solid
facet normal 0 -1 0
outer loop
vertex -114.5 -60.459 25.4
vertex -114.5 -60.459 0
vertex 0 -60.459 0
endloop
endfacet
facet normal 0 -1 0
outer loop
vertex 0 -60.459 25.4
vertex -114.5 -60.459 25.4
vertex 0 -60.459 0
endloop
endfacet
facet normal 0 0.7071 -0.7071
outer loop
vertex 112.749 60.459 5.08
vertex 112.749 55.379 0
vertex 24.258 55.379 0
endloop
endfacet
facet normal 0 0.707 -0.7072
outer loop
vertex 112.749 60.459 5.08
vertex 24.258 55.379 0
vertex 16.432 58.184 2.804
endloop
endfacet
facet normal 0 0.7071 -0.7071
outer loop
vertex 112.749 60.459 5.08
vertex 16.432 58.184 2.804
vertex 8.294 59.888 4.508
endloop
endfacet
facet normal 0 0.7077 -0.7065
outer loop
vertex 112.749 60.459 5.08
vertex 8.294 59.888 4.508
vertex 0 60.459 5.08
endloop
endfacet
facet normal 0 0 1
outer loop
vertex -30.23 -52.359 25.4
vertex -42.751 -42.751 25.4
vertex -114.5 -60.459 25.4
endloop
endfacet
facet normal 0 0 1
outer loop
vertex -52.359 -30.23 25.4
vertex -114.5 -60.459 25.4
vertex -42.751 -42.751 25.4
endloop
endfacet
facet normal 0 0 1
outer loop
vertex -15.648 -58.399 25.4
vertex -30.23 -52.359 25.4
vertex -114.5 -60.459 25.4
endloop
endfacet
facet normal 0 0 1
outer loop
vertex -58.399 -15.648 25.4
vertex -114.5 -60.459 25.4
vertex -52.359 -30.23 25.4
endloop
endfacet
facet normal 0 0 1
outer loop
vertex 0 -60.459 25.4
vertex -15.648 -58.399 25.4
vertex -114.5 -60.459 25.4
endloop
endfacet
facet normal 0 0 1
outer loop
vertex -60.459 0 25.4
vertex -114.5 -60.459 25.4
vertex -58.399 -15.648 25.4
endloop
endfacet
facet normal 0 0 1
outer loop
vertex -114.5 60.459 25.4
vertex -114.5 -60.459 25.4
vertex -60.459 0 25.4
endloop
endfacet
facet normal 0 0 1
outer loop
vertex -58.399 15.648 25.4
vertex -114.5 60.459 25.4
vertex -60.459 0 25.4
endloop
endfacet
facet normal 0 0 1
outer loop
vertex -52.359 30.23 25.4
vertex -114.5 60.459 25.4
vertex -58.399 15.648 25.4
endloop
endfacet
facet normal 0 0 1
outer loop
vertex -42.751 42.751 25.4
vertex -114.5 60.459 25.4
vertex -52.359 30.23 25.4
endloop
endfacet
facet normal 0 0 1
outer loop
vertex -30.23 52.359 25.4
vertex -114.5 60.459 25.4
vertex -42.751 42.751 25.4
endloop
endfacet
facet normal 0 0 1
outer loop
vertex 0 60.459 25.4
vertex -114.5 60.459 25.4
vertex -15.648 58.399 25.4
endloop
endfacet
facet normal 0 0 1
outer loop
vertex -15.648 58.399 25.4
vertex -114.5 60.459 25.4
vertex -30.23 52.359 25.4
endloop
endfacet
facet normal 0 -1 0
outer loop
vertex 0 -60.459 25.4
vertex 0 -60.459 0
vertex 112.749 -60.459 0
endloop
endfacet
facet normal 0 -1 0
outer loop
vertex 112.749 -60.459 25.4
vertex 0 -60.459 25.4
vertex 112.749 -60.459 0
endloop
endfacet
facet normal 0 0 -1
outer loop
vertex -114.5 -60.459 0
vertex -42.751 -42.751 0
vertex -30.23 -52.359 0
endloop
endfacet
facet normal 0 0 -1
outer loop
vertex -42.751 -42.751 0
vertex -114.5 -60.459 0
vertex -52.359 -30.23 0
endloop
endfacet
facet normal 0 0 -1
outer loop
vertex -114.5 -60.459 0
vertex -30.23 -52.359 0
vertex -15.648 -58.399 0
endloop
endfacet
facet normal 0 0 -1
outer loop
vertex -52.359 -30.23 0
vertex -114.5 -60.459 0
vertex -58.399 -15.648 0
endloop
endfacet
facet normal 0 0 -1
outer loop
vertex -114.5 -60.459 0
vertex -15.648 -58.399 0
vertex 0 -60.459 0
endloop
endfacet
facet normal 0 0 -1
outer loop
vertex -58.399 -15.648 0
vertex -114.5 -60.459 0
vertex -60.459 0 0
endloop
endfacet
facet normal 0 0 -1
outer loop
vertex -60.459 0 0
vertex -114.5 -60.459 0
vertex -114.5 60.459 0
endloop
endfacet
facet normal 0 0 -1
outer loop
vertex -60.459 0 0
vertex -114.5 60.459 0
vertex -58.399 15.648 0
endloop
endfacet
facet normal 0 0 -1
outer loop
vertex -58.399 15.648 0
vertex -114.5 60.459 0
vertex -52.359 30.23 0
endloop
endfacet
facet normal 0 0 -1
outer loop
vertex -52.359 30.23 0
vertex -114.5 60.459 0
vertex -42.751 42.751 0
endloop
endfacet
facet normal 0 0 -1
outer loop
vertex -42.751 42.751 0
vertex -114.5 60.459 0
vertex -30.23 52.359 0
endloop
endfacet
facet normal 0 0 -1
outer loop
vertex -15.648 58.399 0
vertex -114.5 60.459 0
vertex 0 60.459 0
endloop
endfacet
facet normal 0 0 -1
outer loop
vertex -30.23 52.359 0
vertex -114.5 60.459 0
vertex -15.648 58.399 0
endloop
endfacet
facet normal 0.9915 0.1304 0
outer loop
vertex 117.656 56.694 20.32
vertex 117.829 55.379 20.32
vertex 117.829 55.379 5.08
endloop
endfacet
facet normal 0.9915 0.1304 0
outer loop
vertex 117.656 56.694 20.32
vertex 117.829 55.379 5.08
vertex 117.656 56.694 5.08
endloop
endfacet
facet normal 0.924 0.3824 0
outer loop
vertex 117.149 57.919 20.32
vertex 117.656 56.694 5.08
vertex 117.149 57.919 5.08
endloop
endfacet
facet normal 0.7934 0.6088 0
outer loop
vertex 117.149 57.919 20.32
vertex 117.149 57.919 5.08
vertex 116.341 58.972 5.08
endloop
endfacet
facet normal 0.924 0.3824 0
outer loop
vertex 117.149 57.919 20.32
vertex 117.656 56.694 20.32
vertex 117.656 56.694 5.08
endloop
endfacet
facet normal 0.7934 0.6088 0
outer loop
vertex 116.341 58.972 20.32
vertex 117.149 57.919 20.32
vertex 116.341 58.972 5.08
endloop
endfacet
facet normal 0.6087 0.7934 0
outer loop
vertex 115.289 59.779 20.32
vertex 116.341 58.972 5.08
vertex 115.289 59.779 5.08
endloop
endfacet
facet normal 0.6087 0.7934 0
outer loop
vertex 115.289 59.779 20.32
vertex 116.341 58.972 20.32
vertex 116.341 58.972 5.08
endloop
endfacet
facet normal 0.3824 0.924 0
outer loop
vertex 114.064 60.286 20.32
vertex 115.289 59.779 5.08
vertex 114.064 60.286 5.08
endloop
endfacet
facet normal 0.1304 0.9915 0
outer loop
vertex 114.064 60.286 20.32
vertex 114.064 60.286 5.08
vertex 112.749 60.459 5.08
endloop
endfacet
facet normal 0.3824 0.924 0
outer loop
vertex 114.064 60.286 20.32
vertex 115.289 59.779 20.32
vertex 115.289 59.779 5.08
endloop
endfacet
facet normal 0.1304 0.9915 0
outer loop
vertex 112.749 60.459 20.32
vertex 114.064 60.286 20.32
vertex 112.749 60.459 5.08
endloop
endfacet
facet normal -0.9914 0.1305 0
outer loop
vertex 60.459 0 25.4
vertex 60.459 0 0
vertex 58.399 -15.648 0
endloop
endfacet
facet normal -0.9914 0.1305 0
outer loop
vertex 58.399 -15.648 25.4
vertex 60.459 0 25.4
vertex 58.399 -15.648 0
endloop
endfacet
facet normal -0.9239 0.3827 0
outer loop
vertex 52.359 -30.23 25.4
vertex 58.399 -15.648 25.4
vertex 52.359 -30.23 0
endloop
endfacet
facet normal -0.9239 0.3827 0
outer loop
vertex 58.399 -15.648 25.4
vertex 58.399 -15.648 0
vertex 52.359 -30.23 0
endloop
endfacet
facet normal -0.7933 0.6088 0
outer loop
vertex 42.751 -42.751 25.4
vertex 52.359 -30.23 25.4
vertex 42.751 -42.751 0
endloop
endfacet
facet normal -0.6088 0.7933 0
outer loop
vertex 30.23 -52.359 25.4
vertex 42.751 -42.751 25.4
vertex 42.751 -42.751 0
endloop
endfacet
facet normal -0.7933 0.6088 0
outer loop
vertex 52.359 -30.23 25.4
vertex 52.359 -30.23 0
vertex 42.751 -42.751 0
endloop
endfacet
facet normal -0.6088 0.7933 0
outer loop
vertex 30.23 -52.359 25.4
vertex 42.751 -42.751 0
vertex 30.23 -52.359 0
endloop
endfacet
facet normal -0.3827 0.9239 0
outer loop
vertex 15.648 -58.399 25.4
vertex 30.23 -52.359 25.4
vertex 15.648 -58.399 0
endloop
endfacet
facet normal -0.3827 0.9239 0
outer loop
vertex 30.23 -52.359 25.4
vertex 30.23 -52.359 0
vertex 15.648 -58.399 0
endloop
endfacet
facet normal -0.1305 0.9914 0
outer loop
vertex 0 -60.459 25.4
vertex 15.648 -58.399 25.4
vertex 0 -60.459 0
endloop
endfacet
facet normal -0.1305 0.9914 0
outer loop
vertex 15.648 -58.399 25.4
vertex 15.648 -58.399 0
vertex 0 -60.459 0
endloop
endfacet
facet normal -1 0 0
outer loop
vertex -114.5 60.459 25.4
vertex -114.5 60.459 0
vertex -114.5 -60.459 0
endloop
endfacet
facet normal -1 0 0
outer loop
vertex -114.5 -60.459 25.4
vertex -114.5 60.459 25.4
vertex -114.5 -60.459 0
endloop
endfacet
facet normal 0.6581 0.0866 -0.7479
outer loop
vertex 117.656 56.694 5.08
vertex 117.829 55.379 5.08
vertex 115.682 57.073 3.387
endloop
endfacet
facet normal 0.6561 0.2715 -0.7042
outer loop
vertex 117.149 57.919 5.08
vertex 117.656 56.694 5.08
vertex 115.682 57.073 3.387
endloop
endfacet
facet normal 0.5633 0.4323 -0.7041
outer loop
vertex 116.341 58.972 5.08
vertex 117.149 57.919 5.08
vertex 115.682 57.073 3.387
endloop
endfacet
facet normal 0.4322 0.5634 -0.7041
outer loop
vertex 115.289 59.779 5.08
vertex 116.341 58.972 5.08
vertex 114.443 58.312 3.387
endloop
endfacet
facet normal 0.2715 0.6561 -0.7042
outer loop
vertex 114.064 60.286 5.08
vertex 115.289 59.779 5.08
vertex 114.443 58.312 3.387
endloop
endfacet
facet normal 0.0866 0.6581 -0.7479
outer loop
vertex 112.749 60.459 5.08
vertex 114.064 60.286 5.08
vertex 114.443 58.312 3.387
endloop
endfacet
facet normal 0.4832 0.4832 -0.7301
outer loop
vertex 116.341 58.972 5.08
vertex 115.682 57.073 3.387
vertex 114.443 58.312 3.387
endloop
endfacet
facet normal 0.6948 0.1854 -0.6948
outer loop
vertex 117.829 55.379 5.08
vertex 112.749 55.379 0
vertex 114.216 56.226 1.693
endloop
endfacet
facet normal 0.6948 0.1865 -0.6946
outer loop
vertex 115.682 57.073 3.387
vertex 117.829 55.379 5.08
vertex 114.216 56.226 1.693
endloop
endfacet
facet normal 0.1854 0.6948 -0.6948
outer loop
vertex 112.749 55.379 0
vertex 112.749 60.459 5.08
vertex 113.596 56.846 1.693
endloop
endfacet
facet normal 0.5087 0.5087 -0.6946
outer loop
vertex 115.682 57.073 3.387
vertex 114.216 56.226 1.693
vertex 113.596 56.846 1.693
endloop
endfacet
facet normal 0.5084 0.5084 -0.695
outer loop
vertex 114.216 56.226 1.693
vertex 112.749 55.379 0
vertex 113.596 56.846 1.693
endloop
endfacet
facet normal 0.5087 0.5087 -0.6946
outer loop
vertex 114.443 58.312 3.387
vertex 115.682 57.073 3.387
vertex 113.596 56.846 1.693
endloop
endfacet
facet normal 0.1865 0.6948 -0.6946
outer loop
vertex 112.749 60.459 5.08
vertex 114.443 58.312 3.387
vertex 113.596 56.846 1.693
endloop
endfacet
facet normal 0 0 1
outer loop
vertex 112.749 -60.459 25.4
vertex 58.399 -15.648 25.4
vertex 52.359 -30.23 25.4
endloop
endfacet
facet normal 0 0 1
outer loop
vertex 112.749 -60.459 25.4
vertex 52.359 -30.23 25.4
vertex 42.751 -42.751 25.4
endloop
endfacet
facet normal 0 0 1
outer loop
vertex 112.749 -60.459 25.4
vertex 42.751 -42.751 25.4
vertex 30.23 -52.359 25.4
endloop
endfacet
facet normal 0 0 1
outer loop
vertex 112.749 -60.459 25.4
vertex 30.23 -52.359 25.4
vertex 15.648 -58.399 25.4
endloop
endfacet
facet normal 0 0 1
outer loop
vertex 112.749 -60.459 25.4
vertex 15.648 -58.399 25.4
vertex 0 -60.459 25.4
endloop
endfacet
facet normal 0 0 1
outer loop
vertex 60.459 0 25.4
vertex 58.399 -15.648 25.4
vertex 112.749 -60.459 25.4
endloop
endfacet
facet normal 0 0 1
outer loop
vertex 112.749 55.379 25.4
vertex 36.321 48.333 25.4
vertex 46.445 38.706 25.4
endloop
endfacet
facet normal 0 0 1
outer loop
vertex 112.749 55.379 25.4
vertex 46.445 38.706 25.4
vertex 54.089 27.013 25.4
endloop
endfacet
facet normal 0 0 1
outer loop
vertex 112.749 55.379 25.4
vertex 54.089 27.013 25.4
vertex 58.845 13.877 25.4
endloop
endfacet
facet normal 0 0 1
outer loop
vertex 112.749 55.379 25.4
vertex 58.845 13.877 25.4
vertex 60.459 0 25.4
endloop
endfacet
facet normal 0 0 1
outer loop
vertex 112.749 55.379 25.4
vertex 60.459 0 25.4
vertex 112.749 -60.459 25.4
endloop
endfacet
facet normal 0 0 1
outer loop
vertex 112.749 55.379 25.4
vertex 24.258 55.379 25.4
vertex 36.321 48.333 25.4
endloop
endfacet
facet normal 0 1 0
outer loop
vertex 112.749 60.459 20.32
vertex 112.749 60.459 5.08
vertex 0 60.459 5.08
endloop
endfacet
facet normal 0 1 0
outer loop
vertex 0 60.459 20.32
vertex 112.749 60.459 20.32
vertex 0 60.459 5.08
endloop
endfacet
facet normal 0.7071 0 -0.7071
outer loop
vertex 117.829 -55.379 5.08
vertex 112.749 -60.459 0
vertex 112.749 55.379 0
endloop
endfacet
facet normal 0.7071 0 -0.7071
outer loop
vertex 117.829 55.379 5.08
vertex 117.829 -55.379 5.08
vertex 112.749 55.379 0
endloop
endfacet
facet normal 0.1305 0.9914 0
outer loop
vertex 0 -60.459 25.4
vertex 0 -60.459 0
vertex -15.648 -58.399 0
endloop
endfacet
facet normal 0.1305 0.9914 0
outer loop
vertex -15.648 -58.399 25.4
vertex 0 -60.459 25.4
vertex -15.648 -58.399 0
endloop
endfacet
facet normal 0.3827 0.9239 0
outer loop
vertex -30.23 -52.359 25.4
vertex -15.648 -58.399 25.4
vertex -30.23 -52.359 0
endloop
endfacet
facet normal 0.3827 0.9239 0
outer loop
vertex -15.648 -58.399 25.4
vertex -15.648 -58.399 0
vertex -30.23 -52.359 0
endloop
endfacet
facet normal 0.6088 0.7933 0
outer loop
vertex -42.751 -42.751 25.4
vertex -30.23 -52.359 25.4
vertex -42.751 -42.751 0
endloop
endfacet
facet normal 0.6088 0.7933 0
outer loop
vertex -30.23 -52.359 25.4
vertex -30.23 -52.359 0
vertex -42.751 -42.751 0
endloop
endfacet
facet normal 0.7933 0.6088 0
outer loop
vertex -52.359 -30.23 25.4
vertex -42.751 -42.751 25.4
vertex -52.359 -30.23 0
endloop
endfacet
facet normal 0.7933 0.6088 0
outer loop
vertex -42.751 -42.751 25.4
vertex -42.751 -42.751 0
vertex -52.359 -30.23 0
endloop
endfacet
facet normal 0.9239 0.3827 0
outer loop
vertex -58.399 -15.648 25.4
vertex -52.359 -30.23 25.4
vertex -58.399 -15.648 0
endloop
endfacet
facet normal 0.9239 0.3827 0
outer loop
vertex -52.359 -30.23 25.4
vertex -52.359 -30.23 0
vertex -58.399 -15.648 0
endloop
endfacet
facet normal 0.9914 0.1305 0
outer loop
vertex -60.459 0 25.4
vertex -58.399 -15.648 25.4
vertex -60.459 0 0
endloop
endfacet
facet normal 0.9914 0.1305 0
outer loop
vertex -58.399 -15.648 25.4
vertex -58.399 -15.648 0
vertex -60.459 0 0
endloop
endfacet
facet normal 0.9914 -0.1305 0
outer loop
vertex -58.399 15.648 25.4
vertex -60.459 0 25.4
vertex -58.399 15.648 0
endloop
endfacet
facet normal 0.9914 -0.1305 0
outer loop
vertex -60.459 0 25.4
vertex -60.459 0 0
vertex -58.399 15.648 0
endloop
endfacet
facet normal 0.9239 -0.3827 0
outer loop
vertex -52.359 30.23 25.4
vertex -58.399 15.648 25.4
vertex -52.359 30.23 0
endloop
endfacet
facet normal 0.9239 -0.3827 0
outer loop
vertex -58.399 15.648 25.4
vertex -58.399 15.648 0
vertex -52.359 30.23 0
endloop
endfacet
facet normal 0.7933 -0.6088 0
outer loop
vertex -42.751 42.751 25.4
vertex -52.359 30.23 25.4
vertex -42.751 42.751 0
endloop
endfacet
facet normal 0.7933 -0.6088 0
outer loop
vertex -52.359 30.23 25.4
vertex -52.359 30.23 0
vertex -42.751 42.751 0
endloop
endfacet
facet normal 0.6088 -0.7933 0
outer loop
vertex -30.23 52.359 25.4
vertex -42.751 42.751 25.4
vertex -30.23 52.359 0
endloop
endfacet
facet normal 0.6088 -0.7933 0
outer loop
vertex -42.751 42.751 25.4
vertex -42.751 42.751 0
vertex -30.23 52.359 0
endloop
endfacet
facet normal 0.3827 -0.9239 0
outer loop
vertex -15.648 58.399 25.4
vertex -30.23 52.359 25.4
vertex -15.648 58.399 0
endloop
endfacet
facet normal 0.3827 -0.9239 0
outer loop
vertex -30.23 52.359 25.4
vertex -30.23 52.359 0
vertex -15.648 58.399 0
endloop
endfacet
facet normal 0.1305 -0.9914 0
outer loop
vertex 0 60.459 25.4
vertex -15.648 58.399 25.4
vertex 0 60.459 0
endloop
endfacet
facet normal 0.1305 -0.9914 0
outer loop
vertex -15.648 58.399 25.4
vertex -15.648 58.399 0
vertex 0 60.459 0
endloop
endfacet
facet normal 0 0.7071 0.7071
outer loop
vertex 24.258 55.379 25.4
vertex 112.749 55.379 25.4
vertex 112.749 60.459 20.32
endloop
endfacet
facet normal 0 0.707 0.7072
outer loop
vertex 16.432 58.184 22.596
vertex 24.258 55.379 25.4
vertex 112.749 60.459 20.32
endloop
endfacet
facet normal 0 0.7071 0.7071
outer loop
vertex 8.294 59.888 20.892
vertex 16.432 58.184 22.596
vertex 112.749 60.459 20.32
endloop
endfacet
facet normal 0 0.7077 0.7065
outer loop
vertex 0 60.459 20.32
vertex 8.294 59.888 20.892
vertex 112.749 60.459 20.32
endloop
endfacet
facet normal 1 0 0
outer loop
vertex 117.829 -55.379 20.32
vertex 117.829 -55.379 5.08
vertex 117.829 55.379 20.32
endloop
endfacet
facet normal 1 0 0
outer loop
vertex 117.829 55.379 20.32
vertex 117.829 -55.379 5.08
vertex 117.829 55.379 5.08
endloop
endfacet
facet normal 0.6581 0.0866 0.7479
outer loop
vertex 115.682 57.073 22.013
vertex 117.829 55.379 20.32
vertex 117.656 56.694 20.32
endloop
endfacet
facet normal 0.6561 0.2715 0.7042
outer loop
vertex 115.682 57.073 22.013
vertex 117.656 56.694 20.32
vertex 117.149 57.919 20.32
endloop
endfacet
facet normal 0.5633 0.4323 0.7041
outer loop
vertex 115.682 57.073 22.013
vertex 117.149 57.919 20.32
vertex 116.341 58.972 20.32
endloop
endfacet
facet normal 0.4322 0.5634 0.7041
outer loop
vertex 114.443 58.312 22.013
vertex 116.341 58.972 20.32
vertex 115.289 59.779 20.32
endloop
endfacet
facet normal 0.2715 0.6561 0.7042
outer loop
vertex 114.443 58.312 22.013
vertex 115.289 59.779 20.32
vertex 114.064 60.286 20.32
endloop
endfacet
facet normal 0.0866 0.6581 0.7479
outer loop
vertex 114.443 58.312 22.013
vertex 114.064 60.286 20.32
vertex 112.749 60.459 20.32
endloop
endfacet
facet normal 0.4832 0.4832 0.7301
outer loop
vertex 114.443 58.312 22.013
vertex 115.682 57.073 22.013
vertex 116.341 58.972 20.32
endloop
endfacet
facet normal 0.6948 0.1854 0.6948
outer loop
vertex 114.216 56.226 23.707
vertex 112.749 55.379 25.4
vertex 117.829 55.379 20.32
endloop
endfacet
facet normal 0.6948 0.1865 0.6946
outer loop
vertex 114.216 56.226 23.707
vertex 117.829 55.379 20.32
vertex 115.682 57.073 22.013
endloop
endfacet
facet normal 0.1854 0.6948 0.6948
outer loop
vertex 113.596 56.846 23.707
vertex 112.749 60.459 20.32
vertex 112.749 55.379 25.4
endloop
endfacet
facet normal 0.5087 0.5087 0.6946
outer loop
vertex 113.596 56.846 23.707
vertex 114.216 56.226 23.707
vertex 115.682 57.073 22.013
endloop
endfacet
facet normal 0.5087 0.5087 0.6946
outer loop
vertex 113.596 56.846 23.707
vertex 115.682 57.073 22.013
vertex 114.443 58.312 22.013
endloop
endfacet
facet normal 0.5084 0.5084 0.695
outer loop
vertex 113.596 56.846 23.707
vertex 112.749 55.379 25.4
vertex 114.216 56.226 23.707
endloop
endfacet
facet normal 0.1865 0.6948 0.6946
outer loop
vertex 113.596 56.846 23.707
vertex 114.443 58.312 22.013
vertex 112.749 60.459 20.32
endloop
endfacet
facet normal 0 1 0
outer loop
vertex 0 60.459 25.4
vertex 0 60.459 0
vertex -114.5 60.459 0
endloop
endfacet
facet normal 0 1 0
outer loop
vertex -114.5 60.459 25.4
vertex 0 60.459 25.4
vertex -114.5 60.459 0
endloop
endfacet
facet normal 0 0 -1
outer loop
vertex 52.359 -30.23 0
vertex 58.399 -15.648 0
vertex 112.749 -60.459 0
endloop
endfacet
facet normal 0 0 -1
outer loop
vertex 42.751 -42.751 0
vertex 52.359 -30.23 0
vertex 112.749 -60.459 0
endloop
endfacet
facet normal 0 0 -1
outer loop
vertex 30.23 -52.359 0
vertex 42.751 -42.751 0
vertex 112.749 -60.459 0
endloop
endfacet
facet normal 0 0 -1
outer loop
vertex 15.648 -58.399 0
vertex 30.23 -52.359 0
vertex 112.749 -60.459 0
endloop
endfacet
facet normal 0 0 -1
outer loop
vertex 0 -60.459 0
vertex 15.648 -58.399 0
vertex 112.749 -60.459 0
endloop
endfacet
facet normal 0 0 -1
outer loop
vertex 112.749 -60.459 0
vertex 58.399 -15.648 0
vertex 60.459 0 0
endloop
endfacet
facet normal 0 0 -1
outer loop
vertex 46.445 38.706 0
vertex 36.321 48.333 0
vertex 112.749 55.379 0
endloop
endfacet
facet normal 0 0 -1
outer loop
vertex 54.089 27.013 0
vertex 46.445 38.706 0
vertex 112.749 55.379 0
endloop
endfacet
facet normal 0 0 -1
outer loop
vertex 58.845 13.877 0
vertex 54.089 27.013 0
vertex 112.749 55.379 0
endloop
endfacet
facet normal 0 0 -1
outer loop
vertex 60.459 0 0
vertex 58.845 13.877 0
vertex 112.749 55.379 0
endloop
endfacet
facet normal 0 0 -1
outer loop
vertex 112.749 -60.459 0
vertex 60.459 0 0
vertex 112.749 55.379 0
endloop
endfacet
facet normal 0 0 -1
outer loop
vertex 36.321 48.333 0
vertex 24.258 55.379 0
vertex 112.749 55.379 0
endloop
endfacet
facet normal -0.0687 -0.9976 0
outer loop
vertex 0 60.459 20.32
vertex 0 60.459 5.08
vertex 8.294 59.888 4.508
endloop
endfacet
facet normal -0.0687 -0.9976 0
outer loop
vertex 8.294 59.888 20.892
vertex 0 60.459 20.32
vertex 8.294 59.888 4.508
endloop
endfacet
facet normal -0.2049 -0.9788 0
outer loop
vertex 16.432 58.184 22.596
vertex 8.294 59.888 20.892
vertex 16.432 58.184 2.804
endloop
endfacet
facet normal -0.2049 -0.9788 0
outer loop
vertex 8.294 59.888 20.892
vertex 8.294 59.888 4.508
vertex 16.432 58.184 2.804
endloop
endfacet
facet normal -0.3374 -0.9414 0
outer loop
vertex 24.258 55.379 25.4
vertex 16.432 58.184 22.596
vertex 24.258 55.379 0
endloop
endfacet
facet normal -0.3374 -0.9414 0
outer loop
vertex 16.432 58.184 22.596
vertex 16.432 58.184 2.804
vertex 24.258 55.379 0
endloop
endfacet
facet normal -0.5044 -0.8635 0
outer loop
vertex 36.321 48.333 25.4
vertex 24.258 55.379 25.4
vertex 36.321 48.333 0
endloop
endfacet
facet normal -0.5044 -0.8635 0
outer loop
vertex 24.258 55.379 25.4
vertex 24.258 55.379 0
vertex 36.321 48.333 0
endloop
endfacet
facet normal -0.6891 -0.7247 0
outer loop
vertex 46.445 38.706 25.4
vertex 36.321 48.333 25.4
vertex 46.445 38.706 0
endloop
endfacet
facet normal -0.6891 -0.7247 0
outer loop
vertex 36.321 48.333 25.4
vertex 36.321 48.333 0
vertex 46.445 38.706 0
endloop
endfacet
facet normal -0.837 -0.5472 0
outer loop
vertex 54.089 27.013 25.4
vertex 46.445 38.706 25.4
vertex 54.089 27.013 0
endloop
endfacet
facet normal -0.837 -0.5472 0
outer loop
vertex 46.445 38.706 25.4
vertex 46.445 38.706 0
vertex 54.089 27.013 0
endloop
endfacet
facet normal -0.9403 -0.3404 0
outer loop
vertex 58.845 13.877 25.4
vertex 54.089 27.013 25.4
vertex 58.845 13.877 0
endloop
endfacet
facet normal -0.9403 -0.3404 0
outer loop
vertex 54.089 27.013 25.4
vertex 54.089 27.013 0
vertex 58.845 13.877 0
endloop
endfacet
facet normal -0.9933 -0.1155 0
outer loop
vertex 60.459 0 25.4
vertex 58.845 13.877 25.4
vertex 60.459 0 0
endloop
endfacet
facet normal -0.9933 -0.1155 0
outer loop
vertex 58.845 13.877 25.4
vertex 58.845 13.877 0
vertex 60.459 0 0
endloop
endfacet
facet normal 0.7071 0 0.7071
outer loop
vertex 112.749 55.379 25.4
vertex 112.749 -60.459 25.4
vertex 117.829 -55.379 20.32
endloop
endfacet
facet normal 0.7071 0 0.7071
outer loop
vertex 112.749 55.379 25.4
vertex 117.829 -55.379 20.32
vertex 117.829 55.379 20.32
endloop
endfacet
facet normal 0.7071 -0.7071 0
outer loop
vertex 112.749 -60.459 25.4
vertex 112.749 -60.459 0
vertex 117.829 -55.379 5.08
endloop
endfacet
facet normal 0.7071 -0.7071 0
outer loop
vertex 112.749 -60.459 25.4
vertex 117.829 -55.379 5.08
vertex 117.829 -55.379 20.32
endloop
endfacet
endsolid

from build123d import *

# Parameters (mm, degrees)
F1_DEPTH = 25.4
F2_R     = 5.08
F3_SIZE  = 5.08


with BuildPart() as f1:
    # F0 (on Top) → F1 (new body)
    with BuildSketch(Plane.XY):
        with BuildLine():
            ThreePointArc((60.459498316, 0), (42.7513212318, -42.7513212611), (-4.14e-08, -60.459498316))
            Line((-4.14e-08, -60.459498316), (117.8293004632, -60.459498316))
            Line((117.8293004632, -60.459498316), (117.8293004632, 60.459498316))
            Line((117.8293004632, 60.459498316), (7.15e-08, 60.459498316))
            ThreePointArc((7.15e-08, 60.459498316), (42.7513212717, 42.7513212211), (60.459498316, 0))
        make_face()
    extrude(amount=F1_DEPTH)

    # F2
    f2_edges = [f1.edges().sort_by_distance(p)[0] for p in [
        (117.8293, 60.459498, 12.7),
    ]]
    fillet(f2_edges, radius=F2_R)

    # F3
    f3_edges = [f1.edges().sort_by_distance(p)[0] for p in [
        (117.8293, -2.54, 0),
        (117.8293, 55.379498, 12.7),
        (117.8293, -60.459498, 12.7),
        (117.8293, -2.54, 25.4),
    ]]
    chamfer(f3_edges, length=F3_SIZE)


with BuildPart() as f1b:
    # F0 (on Top) → F1, piece 2 (new body)
    with BuildSketch(Plane.XY):
        with BuildLine():
            Line((-114.5003661513, 60.459498316), (-114.5003661513, -60.459498316))
            Line((-114.5003661513, -60.459498316), (-4.14e-08, -60.459498316))
            ThreePointArc((-4.14e-08, -60.459498316), (-60.459498316, 5.65e-08), (7.15e-08, 60.459498316))
            Line((7.15e-08, 60.459498316), (-114.5003661513, 60.459498316))
        make_face()
    extrude(amount=F1_DEPTH)


solid = Compound([f1.part, f1b.part])
